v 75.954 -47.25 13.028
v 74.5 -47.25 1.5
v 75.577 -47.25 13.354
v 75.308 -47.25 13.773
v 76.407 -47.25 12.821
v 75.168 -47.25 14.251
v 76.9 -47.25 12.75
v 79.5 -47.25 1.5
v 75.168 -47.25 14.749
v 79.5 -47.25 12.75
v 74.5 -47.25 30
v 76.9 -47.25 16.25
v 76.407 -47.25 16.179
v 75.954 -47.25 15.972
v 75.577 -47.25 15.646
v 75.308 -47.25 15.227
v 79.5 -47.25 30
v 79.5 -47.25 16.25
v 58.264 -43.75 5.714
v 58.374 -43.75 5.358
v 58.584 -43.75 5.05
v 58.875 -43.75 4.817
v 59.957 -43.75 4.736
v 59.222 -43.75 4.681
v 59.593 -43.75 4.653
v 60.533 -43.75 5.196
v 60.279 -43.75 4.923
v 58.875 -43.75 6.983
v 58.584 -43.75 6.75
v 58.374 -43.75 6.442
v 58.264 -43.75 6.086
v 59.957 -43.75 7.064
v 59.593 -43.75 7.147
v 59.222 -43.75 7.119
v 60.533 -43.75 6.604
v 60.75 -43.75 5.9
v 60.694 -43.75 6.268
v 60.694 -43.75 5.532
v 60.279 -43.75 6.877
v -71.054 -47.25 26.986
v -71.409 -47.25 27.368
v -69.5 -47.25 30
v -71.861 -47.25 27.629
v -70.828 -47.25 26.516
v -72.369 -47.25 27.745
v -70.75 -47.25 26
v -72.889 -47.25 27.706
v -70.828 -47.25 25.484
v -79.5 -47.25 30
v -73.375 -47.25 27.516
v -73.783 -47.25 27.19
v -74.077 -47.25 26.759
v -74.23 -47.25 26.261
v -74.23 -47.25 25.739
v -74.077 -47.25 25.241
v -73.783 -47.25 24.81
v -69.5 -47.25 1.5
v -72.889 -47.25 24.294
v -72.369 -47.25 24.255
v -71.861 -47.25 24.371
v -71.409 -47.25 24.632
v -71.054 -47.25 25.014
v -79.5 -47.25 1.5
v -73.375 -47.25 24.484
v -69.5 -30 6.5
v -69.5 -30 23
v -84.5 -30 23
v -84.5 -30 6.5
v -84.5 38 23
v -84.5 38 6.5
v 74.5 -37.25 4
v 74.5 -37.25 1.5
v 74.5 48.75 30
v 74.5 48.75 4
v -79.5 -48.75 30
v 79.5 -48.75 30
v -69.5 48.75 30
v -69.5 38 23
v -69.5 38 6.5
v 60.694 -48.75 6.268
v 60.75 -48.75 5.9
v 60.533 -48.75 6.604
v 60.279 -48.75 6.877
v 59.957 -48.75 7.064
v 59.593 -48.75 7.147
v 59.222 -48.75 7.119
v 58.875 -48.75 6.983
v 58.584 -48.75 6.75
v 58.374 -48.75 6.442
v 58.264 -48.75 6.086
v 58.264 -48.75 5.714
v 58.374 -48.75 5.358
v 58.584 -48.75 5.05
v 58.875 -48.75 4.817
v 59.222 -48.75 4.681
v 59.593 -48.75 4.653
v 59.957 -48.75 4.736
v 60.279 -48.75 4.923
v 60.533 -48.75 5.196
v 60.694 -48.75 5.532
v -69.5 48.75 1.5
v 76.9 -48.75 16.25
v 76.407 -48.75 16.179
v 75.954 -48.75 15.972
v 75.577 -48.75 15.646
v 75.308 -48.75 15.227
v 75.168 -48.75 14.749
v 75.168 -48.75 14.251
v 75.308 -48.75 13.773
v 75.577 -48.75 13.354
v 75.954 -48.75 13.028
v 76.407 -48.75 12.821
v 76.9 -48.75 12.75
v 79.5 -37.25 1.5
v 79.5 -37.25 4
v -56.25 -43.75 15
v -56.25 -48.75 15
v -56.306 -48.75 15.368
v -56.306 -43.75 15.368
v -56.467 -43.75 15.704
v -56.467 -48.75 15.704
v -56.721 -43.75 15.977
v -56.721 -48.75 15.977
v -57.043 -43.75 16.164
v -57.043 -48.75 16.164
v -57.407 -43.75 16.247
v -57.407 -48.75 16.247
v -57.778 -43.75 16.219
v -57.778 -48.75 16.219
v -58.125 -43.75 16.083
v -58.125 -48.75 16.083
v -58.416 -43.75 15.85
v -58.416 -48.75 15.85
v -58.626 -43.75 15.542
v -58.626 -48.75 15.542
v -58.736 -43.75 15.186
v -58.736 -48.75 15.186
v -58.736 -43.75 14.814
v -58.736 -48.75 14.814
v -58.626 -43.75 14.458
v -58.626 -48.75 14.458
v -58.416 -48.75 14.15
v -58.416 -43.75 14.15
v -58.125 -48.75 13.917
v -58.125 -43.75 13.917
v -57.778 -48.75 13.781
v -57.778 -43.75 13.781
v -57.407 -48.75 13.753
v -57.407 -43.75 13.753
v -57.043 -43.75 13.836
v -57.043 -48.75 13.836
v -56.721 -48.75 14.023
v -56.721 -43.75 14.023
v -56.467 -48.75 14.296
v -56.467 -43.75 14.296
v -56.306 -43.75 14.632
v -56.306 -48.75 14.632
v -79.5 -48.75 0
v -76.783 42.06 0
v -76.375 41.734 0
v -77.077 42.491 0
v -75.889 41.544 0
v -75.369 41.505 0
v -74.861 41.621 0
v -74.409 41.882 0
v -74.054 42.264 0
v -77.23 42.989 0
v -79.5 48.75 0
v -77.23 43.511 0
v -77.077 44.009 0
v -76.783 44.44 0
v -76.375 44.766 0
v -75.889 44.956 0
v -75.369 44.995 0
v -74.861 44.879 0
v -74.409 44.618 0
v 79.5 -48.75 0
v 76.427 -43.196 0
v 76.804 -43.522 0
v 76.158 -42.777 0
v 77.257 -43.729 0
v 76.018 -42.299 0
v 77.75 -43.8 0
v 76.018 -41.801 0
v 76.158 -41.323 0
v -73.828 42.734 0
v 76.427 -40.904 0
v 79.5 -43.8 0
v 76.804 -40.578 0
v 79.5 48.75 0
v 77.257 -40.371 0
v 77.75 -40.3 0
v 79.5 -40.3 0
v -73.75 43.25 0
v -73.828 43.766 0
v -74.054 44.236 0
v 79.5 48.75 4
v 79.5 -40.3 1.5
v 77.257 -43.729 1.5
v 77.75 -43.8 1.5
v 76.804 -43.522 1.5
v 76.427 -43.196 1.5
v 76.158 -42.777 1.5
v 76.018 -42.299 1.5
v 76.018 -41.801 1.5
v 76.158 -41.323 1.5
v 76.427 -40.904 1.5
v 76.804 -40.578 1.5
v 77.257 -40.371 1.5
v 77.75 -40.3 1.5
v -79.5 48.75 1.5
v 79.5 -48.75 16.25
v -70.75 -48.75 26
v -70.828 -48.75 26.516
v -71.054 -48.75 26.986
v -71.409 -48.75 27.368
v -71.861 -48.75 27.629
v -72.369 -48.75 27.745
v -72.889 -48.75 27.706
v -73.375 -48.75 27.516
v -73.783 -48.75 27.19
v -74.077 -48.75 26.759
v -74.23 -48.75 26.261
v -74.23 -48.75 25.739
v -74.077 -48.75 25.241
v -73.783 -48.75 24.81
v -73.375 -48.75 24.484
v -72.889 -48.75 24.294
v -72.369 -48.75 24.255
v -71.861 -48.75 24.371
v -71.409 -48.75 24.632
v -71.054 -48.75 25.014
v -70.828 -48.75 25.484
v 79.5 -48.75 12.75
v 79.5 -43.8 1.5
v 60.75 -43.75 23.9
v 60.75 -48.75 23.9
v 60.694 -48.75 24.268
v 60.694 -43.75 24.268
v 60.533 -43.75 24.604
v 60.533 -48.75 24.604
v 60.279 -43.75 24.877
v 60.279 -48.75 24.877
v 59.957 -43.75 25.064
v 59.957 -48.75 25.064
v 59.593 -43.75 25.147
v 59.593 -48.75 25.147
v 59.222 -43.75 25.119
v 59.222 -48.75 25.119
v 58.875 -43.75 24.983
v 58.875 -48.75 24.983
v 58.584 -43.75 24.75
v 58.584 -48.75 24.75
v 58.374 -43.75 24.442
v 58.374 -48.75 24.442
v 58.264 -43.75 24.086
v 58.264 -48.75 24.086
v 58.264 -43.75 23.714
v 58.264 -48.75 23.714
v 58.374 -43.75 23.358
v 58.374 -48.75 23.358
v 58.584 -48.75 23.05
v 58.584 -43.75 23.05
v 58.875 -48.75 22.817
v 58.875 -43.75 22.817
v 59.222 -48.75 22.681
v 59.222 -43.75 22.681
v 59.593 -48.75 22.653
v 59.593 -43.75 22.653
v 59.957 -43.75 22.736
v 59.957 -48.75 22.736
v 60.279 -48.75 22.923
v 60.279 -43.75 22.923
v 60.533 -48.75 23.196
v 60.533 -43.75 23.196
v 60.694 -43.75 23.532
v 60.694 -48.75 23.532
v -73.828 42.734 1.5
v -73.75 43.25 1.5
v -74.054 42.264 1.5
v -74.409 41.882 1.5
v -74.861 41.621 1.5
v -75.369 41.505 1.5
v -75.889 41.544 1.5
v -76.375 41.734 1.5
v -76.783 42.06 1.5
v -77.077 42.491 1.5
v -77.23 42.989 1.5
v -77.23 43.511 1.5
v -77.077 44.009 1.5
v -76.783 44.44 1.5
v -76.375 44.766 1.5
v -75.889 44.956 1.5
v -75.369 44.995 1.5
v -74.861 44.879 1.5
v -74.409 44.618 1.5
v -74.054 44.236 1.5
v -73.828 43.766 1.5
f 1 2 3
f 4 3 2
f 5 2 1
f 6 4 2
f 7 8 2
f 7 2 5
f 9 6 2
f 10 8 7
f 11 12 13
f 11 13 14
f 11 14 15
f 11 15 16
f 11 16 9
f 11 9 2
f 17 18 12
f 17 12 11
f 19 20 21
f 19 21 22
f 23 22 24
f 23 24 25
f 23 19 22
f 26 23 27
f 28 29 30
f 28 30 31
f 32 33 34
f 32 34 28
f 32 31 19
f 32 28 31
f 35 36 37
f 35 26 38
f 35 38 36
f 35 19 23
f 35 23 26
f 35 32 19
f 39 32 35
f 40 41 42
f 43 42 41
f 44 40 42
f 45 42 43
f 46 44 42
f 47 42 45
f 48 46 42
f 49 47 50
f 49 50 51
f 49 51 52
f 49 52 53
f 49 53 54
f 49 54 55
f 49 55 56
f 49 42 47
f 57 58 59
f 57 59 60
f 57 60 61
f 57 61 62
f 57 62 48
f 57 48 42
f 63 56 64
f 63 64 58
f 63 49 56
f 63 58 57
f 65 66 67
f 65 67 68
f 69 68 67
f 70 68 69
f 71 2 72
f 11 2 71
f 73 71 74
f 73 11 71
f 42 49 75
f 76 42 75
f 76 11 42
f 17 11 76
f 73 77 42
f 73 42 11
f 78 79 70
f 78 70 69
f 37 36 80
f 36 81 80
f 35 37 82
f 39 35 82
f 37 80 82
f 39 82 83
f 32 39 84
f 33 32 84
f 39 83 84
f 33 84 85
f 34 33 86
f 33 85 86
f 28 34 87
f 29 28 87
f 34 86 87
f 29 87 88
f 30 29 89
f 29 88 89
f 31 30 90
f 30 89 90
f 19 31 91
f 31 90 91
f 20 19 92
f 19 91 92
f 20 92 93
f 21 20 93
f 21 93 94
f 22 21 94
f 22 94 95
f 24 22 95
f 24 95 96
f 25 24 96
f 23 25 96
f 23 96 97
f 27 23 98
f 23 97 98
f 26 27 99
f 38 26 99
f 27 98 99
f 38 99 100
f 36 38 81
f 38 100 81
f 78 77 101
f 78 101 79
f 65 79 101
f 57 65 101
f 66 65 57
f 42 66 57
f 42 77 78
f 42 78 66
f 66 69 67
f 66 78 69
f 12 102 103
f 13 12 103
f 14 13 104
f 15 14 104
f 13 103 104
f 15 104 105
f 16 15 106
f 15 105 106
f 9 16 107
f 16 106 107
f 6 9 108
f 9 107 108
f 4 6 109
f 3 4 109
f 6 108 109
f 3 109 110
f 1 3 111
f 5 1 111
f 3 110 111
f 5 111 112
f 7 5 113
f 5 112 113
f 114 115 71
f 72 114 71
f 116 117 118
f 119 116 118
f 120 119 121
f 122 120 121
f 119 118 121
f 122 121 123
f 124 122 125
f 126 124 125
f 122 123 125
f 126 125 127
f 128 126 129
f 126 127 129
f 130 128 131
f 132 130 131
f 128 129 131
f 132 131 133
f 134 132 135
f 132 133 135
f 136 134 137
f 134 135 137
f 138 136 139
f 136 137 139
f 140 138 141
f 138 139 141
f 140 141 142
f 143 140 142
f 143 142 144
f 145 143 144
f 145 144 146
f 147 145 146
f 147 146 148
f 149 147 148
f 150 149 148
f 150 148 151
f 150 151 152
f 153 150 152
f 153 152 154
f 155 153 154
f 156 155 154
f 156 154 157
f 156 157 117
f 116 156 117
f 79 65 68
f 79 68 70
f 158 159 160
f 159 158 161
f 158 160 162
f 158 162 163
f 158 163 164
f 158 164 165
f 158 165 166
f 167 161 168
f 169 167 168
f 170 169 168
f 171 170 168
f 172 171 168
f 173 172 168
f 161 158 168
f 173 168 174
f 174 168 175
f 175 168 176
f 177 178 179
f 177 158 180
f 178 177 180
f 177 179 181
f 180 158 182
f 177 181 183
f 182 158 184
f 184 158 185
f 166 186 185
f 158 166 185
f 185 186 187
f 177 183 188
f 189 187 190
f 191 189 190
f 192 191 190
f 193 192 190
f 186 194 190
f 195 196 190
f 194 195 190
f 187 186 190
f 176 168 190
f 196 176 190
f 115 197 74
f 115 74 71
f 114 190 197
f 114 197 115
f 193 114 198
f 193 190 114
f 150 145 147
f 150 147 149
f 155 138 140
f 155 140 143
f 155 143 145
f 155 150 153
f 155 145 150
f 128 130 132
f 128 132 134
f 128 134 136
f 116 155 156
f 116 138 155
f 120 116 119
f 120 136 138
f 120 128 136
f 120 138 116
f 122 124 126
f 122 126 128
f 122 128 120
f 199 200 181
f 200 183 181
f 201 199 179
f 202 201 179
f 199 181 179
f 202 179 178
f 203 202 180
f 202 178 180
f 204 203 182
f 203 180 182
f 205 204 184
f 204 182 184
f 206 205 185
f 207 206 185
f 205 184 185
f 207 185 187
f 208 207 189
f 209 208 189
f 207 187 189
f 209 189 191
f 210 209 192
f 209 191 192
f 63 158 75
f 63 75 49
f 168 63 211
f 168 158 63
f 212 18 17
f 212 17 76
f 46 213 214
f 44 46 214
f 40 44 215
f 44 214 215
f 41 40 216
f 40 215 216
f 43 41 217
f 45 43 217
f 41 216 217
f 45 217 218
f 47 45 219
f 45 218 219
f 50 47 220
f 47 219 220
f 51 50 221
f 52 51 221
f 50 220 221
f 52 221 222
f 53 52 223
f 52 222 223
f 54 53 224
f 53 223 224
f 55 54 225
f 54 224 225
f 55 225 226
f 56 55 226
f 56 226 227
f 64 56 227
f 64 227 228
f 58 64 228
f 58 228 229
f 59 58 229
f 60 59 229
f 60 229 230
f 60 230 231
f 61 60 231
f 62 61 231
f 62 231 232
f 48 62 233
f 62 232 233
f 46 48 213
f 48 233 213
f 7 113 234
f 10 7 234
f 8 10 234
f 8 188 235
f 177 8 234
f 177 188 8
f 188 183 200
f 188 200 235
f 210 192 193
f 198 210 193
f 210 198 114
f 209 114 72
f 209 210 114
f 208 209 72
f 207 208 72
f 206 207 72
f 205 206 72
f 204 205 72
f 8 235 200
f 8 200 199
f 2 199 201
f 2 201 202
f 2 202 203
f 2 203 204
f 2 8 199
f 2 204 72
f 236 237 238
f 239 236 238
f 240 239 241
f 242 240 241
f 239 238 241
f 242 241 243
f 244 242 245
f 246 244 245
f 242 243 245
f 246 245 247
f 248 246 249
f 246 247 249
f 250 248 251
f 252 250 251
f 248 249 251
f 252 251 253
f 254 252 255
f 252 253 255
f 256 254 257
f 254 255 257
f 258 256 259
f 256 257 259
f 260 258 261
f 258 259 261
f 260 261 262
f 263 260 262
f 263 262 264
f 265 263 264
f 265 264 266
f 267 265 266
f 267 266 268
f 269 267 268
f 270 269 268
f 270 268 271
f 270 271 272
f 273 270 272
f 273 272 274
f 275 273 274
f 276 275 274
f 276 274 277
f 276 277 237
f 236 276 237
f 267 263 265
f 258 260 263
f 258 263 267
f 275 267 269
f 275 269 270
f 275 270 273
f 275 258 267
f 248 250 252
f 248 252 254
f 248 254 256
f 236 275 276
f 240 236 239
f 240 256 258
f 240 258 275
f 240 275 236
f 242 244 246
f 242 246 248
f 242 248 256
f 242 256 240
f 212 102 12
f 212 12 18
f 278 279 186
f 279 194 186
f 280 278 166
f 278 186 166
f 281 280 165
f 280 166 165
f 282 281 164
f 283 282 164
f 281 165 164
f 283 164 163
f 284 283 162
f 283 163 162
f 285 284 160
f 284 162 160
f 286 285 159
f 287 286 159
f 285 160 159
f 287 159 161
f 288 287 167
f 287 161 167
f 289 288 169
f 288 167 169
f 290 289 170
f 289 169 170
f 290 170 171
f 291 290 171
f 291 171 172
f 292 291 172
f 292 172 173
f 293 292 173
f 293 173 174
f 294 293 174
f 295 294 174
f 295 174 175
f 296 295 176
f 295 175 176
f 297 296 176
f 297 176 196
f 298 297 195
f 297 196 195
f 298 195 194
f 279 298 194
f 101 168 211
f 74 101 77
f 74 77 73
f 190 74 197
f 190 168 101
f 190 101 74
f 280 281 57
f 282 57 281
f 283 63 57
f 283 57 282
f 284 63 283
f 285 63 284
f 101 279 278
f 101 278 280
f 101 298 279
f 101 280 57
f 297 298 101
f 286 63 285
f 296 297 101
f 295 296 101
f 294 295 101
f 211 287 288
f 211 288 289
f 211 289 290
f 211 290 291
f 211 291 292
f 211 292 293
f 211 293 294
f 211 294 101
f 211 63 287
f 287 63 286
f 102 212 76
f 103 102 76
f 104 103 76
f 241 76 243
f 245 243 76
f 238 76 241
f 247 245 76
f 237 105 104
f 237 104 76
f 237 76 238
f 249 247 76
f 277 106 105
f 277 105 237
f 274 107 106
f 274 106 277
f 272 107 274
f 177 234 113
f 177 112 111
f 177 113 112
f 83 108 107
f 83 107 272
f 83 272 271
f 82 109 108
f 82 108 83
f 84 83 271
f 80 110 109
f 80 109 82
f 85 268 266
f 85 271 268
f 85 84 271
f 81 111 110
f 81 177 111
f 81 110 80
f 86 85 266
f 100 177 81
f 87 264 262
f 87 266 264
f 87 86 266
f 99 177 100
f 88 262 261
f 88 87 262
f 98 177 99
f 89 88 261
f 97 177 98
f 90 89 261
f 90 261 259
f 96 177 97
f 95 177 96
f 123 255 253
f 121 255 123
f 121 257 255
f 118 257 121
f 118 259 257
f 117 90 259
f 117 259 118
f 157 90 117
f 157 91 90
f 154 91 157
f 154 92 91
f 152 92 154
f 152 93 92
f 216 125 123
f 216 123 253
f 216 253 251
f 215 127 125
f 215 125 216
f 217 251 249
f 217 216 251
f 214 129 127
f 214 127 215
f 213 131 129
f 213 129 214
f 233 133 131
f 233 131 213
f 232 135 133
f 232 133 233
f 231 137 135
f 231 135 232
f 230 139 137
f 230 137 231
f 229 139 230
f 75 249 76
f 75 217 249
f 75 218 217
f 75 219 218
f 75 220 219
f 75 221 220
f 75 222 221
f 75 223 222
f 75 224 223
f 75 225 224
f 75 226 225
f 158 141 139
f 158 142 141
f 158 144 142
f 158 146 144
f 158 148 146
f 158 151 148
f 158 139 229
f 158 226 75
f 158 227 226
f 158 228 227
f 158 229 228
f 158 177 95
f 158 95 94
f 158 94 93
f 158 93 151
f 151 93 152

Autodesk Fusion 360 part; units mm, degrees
sketch "Sketch1" plane through (0, 0, 0) normal (0, 0, 1) x (1, 0, 0)
  line L0 (-79.5, 48.75) -> (79.5, 48.75)
  line L1 (79.5, 48.75) -> (79.5, -48.75)
  line L2 (79.5, -48.75) -> (-79.5, -48.75)
  line L3 (-79.5, -48.75) -> (-79.5, 48.75)
  line L4 (-79.5, 0) -> (79.5, 0)
  dimension "d1" = 159
  dimension "d2" = 97.5
extrude "Extrude1" add sketch "Sketch1" along normal blind 30
sketch "Sketch2" plane through (-79.5, 0, 0) normal (-1, 0, 0) x (0, -1, 0)
  line L0 (-48.75, 0) -> (48.75, 0)
  line L1 (48.75, 0) -> (48.75, 30)
  line L2 (48.75, 30) -> (-48.75, 30)
  line L3 (-48.75, 30) -> (-48.75, 0)
  line L4 (-38, 23) -> (30, 23)
  line L5 (30, 23) -> (30, 6.5)
  line L6 (30, 6.5) -> (-38, 6.5)
  line L7 (-38, 6.5) -> (-38, 23)
  line L8 (-48.75, 30) -> (47.25, 30)
  line L9 (47.25, 30) -> (47.25, 1.5)
  line L10 (47.25, 1.5) -> (-48.75, 1.5)
  line L11 (-48.75, 1.5) -> (-48.75, 30)
  dimension "d5" = 68
  dimension "d6" = 16.5
  dimension "d7" = 10.75
  dimension "d8" = 6.5
  dimension "d9" = 1.5
  dimension "d10" = 1.5
extrude "Extrude2" cut sketch "Sketch2" against normal blind 10 contours L2 L3 L8 L9 L10 L11
extrude "Extrude3" add 1 faces at (-79.5, 15.3333, 17.5) along direction (-1, 0, 0) blind 5
sketch "Sketch3" plane through (79.5, 0, 0) normal (1, 0, 0) x (0, 1, 0)
  line L0 (-48.75, 0) -> (48.75, 0)
  line L1 (48.75, 0) -> (48.75, 30)
  line L2 (48.75, 30) -> (-48.75, 30)
  line L3 (-48.75, 30) -> (-48.75, 0)
  line L4 (-47.25, 30) -> (48.75, 30)
  line L5 (48.75, 30) -> (48.75, 4)
  line L6 (48.75, 4) -> (-47.25, 4)
  line L7 (-47.25, 4) -> (-47.25, 30)
  dimension "d15" = 1.5
  dimension "d16" = 4
extrude "Extrude4" cut sketch "Sketch3" against normal blind 5 contours L1 L2 L4 L5 L6 L7
sketch "Sketch4" plane through (0, 0, 4) normal (0, 0, 1) x (-1, 0, 0)
  line L0 (-79.5, 47.25) -> (-79.5, -48.75)
  line L1 (-79.5, -48.75) -> (-74.5, -48.75)
  line L2 (-74.5, -48.75) -> (-74.5, 47.25)
  line L3 (-74.5, 47.25) -> (-79.5, 47.25)
  line L4 (-79.5, 37.25) -> (-74.5, 37.25)
  dimension "d19" = 10
extrude "Extrude5" cut sketch "Sketch4" against normal blind 2.5 contours L0 L2 L3 L4
sketch "Sketch5" plane through (0, -48.75, 0) normal (0, -1, 0) x (1, 0, 0)
  line L0 (-79.5, 0) -> (79.5, 0)
  line L1 (79.5, 0) -> (79.5, 30)
  line L2 (79.5, 30) -> (-79.5, 30)
  line L3 (-79.5, 30) -> (-79.5, 0)
  circle A0 centre (-72.5, 26) radius 1.75
  circle A1 centre (76.9, 14.5) radius 1.75
  circle A2 centre (59.5, 23.9) radius 1.25
  circle A3 centre (59.5, 5.9) radius 1.25
  circle A4 centre (-57.5, 15) radius 1.25
  line L4 (76.9, 16.25) -> (79.5, 16.25)
  line L5 (76.9, 12.75) -> (79.5, 12.75)
  dimension "d22" = 2.5
  dimension "d23" = 2.5
  dimension "d24" = 3.5
  dimension "d25" = 2.6
  dimension "d26" = 14.5
  dimension "d27" = 18
  dimension "d28" = 20
  dimension "d29" = 5.9
  dimension "d30" = 20
  dimension "d31" = 137
  dimension "d32" = 15
  dimension "d33" = 3.5
  dimension "d34" = 26
  dimension "d35" = 152
  dimension "d36" = 2.5
extrude "Extrude6" cut sketch "Sketch5" against normal blind 13 contours A0
extrude "Extrude7" cut sketch "Sketch5" against normal blind 5 contours A4
extrude "Extrude8" cut sketch "Sketch5" against normal blind 1.5 contours L1 A1 L4 L5 | A1
extrude "Extrude9" cut sketch "Sketch5" against normal blind 5 contours A3
extrude "Extrude10" cut sketch "Sketch5" against normal blind 5 contours A2
sketch "Sketch6" plane through (0, 0, 0) normal (0, 0, -1) x (1, 0, 0)
  line L0 (79.5, 48.75) -> (-79.5, 48.75)
  line L1 (-79.5, 48.75) -> (-79.5, -48.75)
  line L2 (-79.5, -48.75) -> (79.5, -48.75)
  line L3 (79.5, -48.75) -> (79.5, 48.75)
  circle A0 centre (-75.5, -43.25) radius 1.75
  circle A1 centre (77.75, 42.05) radius 1.75
  line L4 (77.75, 43.8) -> (79.5, 43.8)
  line L5 (77.75, 40.3) -> (79.5, 40.3)
  dimension "d47" = 3.5
  dimension "d48" = 6.7
  dimension "d49" = 1.75
  dimension "d50" = 3.5
  dimension "d51" = 85.3
  dimension "d52" = 155
extrude "Extrude11" cut sketch "Sketch6" against normal blind 7 contours L3 A1 L4 | A1 | L3 A1 L5
extrude "Extrude12" cut sketch "Sketch6" against normal blind 1.5 contours A0
